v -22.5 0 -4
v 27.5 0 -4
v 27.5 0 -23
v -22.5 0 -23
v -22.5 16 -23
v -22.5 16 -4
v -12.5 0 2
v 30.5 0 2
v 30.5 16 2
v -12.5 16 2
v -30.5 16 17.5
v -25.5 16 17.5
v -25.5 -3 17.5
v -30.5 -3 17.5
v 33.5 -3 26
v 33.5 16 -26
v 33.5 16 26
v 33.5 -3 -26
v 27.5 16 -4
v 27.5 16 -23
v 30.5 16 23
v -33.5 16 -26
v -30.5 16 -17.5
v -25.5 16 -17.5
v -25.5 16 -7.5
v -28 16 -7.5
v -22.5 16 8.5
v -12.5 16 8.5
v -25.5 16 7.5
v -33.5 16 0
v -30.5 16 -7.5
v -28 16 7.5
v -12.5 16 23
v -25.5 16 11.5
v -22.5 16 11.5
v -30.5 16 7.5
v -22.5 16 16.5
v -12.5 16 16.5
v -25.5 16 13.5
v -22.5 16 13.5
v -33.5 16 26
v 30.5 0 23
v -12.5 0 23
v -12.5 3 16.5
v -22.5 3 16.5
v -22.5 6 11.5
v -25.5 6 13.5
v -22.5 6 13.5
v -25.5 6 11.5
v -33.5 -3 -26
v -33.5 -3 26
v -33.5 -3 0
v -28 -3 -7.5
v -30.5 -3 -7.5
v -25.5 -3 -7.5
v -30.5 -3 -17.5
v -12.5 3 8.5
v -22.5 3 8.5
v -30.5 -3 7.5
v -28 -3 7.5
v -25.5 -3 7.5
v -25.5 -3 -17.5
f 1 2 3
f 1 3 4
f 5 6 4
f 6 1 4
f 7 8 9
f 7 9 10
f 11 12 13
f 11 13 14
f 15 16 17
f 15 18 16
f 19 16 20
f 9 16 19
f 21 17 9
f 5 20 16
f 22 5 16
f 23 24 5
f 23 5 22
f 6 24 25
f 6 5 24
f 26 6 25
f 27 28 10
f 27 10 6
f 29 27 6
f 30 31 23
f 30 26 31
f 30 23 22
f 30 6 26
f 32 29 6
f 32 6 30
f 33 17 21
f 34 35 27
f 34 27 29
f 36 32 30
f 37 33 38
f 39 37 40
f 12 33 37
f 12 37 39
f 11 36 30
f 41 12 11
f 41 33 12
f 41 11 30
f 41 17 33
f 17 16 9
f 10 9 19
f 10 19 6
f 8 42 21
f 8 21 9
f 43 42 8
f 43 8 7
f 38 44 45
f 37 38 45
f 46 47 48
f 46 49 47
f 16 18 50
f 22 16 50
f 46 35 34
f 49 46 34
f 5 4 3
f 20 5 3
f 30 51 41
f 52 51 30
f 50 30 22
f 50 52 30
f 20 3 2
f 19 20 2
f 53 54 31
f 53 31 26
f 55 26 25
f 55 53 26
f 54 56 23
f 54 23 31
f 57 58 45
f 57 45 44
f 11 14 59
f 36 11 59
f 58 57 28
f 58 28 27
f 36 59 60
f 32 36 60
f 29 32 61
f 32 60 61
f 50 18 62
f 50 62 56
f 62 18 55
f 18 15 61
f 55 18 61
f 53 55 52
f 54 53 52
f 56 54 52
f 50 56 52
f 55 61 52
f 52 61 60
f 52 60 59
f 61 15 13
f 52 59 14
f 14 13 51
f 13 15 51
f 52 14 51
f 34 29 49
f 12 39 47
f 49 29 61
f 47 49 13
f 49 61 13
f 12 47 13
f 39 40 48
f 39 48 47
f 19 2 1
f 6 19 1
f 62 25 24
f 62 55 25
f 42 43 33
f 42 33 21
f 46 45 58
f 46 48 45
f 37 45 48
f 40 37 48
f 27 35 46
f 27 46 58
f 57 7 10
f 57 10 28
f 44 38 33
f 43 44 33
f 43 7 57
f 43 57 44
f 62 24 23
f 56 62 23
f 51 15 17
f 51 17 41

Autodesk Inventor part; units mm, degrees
ref_plane "YZ Plane" through (0, 0, 0) normal (1, 0, 0) x (0, 1, 0)
ref_plane "XZ Plane" through (0, 0, 0) normal (0, 1, 0) x (-1, 0, 0)
ref_plane "XY Plane" through (0, 0, 0) normal (0, 0, 1) x (1, 0, 0)
sketch "Sketch1" plane through (0, 0, 0) normal (0, 1, 0) x (-1, 0, 0)
  line L0 (-33.5, 26) -> (33.5, 26)
  line L1 (33.5, 26) -> (33.5, -26)
  line L2 (-33.5, -26) -> (-33.5, 26)
  line L3 (-33.5, 26) -> (33.5, -26) construction
  line L4 (33.5, 26) -> (-33.5, -26) construction
  line L5 (33.5, 0) -> (28, 0)
  line L6 (28, 7.5) -> (28, -7.5)
  line L7 (30.5, 7.5) -> (25.5, 7.5)
  line L8 (25.5, 7.5) -> (25.5, 17.5)
  line L9 (25.5, 17.5) -> (30.5, 17.5)
  line L10 (30.5, 17.5) -> (30.5, 7.5)
  line L11 (30.5, -7.5) -> (25.5, -7.5)
  line L12 (25.5, -7.5) -> (25.5, -17.5)
  line L13 (25.5, -17.5) -> (30.5, -17.5)
  line L14 (30.5, -17.5) -> (30.5, -7.5)
  line L15 (22.5, -23) -> (-27.5, -23)
  line L16 (-27.5, -23) -> (-27.5, -4)
  line L17 (-27.5, -4) -> (22.5, -4)
  line L18 (22.5, -4) -> (22.5, -23)
  line L19 (12.5, 23) -> (-30.5, 23)
  line L20 (-30.5, 23) -> (-30.5, 2)
  line L21 (-30.5, 2) -> (12.5, 2)
  line L22 (12.5, 2) -> (12.5, 23)
  line L23 (25.5, 12.5) -> (12.5, 12.5)
  line L24 (-33.5, -26) -> (33.5, -26)
  line L25 (12.5, 16.5) -> (25.5, 16.5)
  line L26 (12.5, 8.5) -> (25.5, 8.5)
  line L27 (25.5, 16.5) -> (22.5, 16.5)
  line L28 (22.5, 16.5) -> (22.5, 13.5)
  line L29 (22.5, 13.5) -> (25.5, 13.5)
  line L30 (22.5, 13.5) -> (22.5, 11.5)
  line L31 (22.5, 11.5) -> (22.5, 8.5)
  line L32 (22.5, 11.5) -> (25.5, 11.5)
  line L33 (24.2677, 11.5) -> (24.2677, 13.5)
  point P0 (0, 0)
  point P1 (24.2677, 12.5)
  dimension "d3" = 15
  dimension "d5" = 10
  dimension "d6" = 5
  dimension "d11" = 50
  dimension "d12" = 3
  dimension "d13" = 43
  dimension "d14" = 13
  dimension "d22" = 19
  dimension "d23" = 21
  dimension "d26" = 3
  dimension "d27" = 3
  dimension "d28" = 3
  dimension "d29" = 3
  dimension "d30" = 6
  dimension "d31" = 67
  dimension "d32" = 52
  dimension "d33" = 8
  dimension "d34" = 3
  dimension "d35" = 2
extrude "Extrusion1" add sketch "Sketch1" along normal blind 16 contours L0 L1 L24 L2 | L26 L31 L32 L8 | L32 L33 L23 L8 | L26 L22 L23 L30 L31 | L8 L29 L28 L25 | L23 L33 L29 L8 | L32 L30 L23 L33 | L28 L30 L23 L22 L25 | L23 L30 L29 L33
sketch "Sketch2" plane through (0, 16, 0) normal (0, 1, 0) x (1, 0, 0)
  line L0 (-12.5, -16.5) -> (-25.5, -16.5) projected
  line L1 (-12.5, -8.5) -> (-25.5, -8.5) projected
  line L2 (-22.5, -11.5) -> (-22.5, -8.5) projected
  line L3 (-22.5, -16.5) -> (-22.5, -13.5) projected
  line L4 (-22.5, -11.5) -> (-25.5, -11.5) projected
  line L5 (-22.5, -13.5) -> (-25.5, -13.5) projected
  line L6 (-25.5, -7.5) -> (-25.5, -17.5) projected
  line L7 (-12.5, -2) -> (-12.5, -23) projected
  line L8 (-22.5, -13.5) -> (-22.5, -11.5) projected
  point P0 (0, 0)
extrude "Extrusion4" cut sketch "Sketch2" against normal blind 13 contours L0 L3 L8 L2 L1 L7
extrude "Extrusion5" cut sketch "Sketch2" against normal blind 10 contours L5 L6 L4 L8
extrude "Extrusion6" add sketch "Sketch1" against normal blind 3 contours L0 L1 L24 L2 | L26 L31 L32 L8 | L32 L33 L23 L8 | L26 L22 L23 L30 L31 | L8 L29 L28 L25 | L23 L33 L29 L8 | L32 L30 L23 L33 | L22 L21 L20 L19 | L28 L30 L23 L22 L25 | L23 L30 L29 L33 | L15 L16 L17 L18
properties part number "Bund"
